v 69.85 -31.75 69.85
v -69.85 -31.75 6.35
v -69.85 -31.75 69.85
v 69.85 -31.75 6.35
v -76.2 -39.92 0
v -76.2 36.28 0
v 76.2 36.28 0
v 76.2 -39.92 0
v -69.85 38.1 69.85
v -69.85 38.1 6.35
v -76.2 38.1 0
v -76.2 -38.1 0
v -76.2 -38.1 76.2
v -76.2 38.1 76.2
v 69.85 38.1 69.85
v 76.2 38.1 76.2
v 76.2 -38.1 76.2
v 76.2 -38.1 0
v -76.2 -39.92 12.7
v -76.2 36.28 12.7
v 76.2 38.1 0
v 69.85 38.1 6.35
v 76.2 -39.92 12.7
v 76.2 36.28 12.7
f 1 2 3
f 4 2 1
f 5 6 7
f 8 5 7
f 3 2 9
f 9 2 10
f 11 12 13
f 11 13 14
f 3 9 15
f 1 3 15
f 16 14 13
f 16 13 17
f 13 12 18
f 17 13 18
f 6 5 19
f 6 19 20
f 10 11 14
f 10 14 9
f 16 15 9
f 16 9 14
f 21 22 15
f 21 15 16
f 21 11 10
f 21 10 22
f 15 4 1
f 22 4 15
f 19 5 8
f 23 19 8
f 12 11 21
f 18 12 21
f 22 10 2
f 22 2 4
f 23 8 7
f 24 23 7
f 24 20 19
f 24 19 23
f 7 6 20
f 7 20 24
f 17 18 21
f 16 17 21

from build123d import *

# Parameters (mm, degrees)
F0_W     = 152.4
F0_H     = 76.2
F1_DEPTH = 76.2
F2_T     = -6.35
F3_W     = 152.4
F3_H     = 76.2
F4_DEPTH = 12.7


with BuildPart() as f1:
    # F0 (on Top) → F1 (new body)
    with BuildSketch(Plane.XY):
        Rectangle(F0_W, F0_H)
    extrude(amount=F1_DEPTH)

    # F2
    f2_openings = [f1.faces().sort_by_distance(p)[0] for p in [
        (0, 38.1, 38.1),
    ]]
    offset(amount=F2_T, openings=f2_openings)


with BuildPart() as f4:
    # F3 (on Top) → F4 (new body)
    with BuildSketch(Plane.XY):
        with Locations((0, -1.819701)):
            Rectangle(F3_W, F3_H)
    extrude(amount=F4_DEPTH)


solid = Compound([f1.part, f4.part])
